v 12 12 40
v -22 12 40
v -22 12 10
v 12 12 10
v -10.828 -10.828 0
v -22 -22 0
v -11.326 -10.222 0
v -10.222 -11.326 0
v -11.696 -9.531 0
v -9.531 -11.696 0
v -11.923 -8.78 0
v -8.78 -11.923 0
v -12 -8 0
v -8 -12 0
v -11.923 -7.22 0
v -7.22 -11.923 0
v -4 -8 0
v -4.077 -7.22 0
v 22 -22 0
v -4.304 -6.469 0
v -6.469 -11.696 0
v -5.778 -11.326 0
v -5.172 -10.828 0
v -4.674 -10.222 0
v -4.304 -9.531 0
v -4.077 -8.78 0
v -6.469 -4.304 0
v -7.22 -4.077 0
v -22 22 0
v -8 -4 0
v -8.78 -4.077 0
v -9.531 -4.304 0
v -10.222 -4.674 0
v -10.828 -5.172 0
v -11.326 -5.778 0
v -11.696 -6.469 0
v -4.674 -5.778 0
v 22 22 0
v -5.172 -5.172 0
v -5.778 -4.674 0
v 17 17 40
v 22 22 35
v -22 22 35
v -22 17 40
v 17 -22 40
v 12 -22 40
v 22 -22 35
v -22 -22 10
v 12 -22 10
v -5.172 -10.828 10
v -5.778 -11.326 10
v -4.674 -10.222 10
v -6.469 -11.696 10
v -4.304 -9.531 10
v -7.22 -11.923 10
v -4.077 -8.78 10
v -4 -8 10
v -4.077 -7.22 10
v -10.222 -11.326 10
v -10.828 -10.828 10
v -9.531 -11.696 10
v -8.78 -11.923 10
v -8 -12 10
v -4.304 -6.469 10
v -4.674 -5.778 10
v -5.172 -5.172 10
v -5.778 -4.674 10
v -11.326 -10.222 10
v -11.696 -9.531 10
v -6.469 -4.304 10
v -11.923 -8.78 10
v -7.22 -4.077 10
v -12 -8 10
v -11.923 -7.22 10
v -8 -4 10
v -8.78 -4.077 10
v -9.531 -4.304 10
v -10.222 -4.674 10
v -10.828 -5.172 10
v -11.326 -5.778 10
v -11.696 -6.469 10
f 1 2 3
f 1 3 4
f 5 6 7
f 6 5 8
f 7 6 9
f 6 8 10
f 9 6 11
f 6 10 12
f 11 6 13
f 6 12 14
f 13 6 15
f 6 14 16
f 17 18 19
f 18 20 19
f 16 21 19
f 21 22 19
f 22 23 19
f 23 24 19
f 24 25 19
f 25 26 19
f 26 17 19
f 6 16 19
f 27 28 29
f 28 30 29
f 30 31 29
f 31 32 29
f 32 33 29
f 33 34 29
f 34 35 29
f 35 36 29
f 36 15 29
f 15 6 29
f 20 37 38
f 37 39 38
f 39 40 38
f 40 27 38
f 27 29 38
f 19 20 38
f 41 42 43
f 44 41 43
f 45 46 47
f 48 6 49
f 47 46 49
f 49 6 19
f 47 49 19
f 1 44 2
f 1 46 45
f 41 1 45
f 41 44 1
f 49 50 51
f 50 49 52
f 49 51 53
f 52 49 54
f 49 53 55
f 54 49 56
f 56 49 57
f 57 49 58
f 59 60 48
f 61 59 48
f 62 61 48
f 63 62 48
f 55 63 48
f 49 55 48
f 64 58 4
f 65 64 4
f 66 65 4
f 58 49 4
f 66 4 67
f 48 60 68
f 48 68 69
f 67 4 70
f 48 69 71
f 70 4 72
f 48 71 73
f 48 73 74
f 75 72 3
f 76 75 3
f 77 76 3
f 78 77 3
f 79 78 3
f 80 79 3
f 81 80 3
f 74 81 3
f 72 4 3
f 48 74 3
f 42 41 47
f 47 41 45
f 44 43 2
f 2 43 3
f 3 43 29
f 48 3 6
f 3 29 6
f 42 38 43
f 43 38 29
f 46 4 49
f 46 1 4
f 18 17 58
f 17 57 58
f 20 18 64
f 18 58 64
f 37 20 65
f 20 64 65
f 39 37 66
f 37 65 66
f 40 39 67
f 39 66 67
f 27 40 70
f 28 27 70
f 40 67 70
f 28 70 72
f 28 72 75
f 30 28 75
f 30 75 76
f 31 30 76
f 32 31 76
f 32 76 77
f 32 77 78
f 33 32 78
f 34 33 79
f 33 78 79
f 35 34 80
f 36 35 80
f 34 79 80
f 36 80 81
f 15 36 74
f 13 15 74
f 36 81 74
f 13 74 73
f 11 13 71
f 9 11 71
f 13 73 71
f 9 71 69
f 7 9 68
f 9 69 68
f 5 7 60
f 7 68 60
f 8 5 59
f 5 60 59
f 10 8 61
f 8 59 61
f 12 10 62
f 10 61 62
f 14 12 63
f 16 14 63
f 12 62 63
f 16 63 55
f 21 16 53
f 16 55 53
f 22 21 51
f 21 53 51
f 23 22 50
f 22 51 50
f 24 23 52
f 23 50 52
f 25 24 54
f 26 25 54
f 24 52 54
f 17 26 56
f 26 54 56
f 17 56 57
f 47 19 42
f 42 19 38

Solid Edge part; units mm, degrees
sketch "Sketch1" plane through (0, 0, 0) normal (0, 0, 1) x (1, 0, 0)
  line L0 (-22, -22) -> (22, -22)
  line L1 (22, -22) -> (22, 22)
  line L2 (22, 22) -> (-22, 22)
  line L3 (-22, 22) -> (-22, -22)
  dimension "D1" = 44
extrude "Protrusion1" add sketch "Sketch1" along normal blind 40
sketch "Sketch2" plane through (0, 0, 40) normal (0, 0, 1) x (1, 0, 0)
  line L0 (-22, 12) -> (12, 12)
  line L1 (12, 12) -> (12, -22)
  line L2 (12, -22) -> (-22, -22)
  line L3 (-22, -22) -> (-22, 12)
  dimension "D1" = 34
extrude "ExtrudedCutout_1" cut sketch "Sketch2" against normal blind 30
chamfer "Chamfer_1" distance 5 angle 45 2 edges at (22, 0, 40) (0, 22, 40)
sketch "Sketch3" plane through (-5, -5, 10) normal (0, 0, 1) x (1, 0, 0)
  circle A0 centre (-3, -3) radius 4
  dimension "D1" = 8
extrude "Cutout1" cut sketch "Sketch3" against normal through all
properties material "Polyethylene, low density"
